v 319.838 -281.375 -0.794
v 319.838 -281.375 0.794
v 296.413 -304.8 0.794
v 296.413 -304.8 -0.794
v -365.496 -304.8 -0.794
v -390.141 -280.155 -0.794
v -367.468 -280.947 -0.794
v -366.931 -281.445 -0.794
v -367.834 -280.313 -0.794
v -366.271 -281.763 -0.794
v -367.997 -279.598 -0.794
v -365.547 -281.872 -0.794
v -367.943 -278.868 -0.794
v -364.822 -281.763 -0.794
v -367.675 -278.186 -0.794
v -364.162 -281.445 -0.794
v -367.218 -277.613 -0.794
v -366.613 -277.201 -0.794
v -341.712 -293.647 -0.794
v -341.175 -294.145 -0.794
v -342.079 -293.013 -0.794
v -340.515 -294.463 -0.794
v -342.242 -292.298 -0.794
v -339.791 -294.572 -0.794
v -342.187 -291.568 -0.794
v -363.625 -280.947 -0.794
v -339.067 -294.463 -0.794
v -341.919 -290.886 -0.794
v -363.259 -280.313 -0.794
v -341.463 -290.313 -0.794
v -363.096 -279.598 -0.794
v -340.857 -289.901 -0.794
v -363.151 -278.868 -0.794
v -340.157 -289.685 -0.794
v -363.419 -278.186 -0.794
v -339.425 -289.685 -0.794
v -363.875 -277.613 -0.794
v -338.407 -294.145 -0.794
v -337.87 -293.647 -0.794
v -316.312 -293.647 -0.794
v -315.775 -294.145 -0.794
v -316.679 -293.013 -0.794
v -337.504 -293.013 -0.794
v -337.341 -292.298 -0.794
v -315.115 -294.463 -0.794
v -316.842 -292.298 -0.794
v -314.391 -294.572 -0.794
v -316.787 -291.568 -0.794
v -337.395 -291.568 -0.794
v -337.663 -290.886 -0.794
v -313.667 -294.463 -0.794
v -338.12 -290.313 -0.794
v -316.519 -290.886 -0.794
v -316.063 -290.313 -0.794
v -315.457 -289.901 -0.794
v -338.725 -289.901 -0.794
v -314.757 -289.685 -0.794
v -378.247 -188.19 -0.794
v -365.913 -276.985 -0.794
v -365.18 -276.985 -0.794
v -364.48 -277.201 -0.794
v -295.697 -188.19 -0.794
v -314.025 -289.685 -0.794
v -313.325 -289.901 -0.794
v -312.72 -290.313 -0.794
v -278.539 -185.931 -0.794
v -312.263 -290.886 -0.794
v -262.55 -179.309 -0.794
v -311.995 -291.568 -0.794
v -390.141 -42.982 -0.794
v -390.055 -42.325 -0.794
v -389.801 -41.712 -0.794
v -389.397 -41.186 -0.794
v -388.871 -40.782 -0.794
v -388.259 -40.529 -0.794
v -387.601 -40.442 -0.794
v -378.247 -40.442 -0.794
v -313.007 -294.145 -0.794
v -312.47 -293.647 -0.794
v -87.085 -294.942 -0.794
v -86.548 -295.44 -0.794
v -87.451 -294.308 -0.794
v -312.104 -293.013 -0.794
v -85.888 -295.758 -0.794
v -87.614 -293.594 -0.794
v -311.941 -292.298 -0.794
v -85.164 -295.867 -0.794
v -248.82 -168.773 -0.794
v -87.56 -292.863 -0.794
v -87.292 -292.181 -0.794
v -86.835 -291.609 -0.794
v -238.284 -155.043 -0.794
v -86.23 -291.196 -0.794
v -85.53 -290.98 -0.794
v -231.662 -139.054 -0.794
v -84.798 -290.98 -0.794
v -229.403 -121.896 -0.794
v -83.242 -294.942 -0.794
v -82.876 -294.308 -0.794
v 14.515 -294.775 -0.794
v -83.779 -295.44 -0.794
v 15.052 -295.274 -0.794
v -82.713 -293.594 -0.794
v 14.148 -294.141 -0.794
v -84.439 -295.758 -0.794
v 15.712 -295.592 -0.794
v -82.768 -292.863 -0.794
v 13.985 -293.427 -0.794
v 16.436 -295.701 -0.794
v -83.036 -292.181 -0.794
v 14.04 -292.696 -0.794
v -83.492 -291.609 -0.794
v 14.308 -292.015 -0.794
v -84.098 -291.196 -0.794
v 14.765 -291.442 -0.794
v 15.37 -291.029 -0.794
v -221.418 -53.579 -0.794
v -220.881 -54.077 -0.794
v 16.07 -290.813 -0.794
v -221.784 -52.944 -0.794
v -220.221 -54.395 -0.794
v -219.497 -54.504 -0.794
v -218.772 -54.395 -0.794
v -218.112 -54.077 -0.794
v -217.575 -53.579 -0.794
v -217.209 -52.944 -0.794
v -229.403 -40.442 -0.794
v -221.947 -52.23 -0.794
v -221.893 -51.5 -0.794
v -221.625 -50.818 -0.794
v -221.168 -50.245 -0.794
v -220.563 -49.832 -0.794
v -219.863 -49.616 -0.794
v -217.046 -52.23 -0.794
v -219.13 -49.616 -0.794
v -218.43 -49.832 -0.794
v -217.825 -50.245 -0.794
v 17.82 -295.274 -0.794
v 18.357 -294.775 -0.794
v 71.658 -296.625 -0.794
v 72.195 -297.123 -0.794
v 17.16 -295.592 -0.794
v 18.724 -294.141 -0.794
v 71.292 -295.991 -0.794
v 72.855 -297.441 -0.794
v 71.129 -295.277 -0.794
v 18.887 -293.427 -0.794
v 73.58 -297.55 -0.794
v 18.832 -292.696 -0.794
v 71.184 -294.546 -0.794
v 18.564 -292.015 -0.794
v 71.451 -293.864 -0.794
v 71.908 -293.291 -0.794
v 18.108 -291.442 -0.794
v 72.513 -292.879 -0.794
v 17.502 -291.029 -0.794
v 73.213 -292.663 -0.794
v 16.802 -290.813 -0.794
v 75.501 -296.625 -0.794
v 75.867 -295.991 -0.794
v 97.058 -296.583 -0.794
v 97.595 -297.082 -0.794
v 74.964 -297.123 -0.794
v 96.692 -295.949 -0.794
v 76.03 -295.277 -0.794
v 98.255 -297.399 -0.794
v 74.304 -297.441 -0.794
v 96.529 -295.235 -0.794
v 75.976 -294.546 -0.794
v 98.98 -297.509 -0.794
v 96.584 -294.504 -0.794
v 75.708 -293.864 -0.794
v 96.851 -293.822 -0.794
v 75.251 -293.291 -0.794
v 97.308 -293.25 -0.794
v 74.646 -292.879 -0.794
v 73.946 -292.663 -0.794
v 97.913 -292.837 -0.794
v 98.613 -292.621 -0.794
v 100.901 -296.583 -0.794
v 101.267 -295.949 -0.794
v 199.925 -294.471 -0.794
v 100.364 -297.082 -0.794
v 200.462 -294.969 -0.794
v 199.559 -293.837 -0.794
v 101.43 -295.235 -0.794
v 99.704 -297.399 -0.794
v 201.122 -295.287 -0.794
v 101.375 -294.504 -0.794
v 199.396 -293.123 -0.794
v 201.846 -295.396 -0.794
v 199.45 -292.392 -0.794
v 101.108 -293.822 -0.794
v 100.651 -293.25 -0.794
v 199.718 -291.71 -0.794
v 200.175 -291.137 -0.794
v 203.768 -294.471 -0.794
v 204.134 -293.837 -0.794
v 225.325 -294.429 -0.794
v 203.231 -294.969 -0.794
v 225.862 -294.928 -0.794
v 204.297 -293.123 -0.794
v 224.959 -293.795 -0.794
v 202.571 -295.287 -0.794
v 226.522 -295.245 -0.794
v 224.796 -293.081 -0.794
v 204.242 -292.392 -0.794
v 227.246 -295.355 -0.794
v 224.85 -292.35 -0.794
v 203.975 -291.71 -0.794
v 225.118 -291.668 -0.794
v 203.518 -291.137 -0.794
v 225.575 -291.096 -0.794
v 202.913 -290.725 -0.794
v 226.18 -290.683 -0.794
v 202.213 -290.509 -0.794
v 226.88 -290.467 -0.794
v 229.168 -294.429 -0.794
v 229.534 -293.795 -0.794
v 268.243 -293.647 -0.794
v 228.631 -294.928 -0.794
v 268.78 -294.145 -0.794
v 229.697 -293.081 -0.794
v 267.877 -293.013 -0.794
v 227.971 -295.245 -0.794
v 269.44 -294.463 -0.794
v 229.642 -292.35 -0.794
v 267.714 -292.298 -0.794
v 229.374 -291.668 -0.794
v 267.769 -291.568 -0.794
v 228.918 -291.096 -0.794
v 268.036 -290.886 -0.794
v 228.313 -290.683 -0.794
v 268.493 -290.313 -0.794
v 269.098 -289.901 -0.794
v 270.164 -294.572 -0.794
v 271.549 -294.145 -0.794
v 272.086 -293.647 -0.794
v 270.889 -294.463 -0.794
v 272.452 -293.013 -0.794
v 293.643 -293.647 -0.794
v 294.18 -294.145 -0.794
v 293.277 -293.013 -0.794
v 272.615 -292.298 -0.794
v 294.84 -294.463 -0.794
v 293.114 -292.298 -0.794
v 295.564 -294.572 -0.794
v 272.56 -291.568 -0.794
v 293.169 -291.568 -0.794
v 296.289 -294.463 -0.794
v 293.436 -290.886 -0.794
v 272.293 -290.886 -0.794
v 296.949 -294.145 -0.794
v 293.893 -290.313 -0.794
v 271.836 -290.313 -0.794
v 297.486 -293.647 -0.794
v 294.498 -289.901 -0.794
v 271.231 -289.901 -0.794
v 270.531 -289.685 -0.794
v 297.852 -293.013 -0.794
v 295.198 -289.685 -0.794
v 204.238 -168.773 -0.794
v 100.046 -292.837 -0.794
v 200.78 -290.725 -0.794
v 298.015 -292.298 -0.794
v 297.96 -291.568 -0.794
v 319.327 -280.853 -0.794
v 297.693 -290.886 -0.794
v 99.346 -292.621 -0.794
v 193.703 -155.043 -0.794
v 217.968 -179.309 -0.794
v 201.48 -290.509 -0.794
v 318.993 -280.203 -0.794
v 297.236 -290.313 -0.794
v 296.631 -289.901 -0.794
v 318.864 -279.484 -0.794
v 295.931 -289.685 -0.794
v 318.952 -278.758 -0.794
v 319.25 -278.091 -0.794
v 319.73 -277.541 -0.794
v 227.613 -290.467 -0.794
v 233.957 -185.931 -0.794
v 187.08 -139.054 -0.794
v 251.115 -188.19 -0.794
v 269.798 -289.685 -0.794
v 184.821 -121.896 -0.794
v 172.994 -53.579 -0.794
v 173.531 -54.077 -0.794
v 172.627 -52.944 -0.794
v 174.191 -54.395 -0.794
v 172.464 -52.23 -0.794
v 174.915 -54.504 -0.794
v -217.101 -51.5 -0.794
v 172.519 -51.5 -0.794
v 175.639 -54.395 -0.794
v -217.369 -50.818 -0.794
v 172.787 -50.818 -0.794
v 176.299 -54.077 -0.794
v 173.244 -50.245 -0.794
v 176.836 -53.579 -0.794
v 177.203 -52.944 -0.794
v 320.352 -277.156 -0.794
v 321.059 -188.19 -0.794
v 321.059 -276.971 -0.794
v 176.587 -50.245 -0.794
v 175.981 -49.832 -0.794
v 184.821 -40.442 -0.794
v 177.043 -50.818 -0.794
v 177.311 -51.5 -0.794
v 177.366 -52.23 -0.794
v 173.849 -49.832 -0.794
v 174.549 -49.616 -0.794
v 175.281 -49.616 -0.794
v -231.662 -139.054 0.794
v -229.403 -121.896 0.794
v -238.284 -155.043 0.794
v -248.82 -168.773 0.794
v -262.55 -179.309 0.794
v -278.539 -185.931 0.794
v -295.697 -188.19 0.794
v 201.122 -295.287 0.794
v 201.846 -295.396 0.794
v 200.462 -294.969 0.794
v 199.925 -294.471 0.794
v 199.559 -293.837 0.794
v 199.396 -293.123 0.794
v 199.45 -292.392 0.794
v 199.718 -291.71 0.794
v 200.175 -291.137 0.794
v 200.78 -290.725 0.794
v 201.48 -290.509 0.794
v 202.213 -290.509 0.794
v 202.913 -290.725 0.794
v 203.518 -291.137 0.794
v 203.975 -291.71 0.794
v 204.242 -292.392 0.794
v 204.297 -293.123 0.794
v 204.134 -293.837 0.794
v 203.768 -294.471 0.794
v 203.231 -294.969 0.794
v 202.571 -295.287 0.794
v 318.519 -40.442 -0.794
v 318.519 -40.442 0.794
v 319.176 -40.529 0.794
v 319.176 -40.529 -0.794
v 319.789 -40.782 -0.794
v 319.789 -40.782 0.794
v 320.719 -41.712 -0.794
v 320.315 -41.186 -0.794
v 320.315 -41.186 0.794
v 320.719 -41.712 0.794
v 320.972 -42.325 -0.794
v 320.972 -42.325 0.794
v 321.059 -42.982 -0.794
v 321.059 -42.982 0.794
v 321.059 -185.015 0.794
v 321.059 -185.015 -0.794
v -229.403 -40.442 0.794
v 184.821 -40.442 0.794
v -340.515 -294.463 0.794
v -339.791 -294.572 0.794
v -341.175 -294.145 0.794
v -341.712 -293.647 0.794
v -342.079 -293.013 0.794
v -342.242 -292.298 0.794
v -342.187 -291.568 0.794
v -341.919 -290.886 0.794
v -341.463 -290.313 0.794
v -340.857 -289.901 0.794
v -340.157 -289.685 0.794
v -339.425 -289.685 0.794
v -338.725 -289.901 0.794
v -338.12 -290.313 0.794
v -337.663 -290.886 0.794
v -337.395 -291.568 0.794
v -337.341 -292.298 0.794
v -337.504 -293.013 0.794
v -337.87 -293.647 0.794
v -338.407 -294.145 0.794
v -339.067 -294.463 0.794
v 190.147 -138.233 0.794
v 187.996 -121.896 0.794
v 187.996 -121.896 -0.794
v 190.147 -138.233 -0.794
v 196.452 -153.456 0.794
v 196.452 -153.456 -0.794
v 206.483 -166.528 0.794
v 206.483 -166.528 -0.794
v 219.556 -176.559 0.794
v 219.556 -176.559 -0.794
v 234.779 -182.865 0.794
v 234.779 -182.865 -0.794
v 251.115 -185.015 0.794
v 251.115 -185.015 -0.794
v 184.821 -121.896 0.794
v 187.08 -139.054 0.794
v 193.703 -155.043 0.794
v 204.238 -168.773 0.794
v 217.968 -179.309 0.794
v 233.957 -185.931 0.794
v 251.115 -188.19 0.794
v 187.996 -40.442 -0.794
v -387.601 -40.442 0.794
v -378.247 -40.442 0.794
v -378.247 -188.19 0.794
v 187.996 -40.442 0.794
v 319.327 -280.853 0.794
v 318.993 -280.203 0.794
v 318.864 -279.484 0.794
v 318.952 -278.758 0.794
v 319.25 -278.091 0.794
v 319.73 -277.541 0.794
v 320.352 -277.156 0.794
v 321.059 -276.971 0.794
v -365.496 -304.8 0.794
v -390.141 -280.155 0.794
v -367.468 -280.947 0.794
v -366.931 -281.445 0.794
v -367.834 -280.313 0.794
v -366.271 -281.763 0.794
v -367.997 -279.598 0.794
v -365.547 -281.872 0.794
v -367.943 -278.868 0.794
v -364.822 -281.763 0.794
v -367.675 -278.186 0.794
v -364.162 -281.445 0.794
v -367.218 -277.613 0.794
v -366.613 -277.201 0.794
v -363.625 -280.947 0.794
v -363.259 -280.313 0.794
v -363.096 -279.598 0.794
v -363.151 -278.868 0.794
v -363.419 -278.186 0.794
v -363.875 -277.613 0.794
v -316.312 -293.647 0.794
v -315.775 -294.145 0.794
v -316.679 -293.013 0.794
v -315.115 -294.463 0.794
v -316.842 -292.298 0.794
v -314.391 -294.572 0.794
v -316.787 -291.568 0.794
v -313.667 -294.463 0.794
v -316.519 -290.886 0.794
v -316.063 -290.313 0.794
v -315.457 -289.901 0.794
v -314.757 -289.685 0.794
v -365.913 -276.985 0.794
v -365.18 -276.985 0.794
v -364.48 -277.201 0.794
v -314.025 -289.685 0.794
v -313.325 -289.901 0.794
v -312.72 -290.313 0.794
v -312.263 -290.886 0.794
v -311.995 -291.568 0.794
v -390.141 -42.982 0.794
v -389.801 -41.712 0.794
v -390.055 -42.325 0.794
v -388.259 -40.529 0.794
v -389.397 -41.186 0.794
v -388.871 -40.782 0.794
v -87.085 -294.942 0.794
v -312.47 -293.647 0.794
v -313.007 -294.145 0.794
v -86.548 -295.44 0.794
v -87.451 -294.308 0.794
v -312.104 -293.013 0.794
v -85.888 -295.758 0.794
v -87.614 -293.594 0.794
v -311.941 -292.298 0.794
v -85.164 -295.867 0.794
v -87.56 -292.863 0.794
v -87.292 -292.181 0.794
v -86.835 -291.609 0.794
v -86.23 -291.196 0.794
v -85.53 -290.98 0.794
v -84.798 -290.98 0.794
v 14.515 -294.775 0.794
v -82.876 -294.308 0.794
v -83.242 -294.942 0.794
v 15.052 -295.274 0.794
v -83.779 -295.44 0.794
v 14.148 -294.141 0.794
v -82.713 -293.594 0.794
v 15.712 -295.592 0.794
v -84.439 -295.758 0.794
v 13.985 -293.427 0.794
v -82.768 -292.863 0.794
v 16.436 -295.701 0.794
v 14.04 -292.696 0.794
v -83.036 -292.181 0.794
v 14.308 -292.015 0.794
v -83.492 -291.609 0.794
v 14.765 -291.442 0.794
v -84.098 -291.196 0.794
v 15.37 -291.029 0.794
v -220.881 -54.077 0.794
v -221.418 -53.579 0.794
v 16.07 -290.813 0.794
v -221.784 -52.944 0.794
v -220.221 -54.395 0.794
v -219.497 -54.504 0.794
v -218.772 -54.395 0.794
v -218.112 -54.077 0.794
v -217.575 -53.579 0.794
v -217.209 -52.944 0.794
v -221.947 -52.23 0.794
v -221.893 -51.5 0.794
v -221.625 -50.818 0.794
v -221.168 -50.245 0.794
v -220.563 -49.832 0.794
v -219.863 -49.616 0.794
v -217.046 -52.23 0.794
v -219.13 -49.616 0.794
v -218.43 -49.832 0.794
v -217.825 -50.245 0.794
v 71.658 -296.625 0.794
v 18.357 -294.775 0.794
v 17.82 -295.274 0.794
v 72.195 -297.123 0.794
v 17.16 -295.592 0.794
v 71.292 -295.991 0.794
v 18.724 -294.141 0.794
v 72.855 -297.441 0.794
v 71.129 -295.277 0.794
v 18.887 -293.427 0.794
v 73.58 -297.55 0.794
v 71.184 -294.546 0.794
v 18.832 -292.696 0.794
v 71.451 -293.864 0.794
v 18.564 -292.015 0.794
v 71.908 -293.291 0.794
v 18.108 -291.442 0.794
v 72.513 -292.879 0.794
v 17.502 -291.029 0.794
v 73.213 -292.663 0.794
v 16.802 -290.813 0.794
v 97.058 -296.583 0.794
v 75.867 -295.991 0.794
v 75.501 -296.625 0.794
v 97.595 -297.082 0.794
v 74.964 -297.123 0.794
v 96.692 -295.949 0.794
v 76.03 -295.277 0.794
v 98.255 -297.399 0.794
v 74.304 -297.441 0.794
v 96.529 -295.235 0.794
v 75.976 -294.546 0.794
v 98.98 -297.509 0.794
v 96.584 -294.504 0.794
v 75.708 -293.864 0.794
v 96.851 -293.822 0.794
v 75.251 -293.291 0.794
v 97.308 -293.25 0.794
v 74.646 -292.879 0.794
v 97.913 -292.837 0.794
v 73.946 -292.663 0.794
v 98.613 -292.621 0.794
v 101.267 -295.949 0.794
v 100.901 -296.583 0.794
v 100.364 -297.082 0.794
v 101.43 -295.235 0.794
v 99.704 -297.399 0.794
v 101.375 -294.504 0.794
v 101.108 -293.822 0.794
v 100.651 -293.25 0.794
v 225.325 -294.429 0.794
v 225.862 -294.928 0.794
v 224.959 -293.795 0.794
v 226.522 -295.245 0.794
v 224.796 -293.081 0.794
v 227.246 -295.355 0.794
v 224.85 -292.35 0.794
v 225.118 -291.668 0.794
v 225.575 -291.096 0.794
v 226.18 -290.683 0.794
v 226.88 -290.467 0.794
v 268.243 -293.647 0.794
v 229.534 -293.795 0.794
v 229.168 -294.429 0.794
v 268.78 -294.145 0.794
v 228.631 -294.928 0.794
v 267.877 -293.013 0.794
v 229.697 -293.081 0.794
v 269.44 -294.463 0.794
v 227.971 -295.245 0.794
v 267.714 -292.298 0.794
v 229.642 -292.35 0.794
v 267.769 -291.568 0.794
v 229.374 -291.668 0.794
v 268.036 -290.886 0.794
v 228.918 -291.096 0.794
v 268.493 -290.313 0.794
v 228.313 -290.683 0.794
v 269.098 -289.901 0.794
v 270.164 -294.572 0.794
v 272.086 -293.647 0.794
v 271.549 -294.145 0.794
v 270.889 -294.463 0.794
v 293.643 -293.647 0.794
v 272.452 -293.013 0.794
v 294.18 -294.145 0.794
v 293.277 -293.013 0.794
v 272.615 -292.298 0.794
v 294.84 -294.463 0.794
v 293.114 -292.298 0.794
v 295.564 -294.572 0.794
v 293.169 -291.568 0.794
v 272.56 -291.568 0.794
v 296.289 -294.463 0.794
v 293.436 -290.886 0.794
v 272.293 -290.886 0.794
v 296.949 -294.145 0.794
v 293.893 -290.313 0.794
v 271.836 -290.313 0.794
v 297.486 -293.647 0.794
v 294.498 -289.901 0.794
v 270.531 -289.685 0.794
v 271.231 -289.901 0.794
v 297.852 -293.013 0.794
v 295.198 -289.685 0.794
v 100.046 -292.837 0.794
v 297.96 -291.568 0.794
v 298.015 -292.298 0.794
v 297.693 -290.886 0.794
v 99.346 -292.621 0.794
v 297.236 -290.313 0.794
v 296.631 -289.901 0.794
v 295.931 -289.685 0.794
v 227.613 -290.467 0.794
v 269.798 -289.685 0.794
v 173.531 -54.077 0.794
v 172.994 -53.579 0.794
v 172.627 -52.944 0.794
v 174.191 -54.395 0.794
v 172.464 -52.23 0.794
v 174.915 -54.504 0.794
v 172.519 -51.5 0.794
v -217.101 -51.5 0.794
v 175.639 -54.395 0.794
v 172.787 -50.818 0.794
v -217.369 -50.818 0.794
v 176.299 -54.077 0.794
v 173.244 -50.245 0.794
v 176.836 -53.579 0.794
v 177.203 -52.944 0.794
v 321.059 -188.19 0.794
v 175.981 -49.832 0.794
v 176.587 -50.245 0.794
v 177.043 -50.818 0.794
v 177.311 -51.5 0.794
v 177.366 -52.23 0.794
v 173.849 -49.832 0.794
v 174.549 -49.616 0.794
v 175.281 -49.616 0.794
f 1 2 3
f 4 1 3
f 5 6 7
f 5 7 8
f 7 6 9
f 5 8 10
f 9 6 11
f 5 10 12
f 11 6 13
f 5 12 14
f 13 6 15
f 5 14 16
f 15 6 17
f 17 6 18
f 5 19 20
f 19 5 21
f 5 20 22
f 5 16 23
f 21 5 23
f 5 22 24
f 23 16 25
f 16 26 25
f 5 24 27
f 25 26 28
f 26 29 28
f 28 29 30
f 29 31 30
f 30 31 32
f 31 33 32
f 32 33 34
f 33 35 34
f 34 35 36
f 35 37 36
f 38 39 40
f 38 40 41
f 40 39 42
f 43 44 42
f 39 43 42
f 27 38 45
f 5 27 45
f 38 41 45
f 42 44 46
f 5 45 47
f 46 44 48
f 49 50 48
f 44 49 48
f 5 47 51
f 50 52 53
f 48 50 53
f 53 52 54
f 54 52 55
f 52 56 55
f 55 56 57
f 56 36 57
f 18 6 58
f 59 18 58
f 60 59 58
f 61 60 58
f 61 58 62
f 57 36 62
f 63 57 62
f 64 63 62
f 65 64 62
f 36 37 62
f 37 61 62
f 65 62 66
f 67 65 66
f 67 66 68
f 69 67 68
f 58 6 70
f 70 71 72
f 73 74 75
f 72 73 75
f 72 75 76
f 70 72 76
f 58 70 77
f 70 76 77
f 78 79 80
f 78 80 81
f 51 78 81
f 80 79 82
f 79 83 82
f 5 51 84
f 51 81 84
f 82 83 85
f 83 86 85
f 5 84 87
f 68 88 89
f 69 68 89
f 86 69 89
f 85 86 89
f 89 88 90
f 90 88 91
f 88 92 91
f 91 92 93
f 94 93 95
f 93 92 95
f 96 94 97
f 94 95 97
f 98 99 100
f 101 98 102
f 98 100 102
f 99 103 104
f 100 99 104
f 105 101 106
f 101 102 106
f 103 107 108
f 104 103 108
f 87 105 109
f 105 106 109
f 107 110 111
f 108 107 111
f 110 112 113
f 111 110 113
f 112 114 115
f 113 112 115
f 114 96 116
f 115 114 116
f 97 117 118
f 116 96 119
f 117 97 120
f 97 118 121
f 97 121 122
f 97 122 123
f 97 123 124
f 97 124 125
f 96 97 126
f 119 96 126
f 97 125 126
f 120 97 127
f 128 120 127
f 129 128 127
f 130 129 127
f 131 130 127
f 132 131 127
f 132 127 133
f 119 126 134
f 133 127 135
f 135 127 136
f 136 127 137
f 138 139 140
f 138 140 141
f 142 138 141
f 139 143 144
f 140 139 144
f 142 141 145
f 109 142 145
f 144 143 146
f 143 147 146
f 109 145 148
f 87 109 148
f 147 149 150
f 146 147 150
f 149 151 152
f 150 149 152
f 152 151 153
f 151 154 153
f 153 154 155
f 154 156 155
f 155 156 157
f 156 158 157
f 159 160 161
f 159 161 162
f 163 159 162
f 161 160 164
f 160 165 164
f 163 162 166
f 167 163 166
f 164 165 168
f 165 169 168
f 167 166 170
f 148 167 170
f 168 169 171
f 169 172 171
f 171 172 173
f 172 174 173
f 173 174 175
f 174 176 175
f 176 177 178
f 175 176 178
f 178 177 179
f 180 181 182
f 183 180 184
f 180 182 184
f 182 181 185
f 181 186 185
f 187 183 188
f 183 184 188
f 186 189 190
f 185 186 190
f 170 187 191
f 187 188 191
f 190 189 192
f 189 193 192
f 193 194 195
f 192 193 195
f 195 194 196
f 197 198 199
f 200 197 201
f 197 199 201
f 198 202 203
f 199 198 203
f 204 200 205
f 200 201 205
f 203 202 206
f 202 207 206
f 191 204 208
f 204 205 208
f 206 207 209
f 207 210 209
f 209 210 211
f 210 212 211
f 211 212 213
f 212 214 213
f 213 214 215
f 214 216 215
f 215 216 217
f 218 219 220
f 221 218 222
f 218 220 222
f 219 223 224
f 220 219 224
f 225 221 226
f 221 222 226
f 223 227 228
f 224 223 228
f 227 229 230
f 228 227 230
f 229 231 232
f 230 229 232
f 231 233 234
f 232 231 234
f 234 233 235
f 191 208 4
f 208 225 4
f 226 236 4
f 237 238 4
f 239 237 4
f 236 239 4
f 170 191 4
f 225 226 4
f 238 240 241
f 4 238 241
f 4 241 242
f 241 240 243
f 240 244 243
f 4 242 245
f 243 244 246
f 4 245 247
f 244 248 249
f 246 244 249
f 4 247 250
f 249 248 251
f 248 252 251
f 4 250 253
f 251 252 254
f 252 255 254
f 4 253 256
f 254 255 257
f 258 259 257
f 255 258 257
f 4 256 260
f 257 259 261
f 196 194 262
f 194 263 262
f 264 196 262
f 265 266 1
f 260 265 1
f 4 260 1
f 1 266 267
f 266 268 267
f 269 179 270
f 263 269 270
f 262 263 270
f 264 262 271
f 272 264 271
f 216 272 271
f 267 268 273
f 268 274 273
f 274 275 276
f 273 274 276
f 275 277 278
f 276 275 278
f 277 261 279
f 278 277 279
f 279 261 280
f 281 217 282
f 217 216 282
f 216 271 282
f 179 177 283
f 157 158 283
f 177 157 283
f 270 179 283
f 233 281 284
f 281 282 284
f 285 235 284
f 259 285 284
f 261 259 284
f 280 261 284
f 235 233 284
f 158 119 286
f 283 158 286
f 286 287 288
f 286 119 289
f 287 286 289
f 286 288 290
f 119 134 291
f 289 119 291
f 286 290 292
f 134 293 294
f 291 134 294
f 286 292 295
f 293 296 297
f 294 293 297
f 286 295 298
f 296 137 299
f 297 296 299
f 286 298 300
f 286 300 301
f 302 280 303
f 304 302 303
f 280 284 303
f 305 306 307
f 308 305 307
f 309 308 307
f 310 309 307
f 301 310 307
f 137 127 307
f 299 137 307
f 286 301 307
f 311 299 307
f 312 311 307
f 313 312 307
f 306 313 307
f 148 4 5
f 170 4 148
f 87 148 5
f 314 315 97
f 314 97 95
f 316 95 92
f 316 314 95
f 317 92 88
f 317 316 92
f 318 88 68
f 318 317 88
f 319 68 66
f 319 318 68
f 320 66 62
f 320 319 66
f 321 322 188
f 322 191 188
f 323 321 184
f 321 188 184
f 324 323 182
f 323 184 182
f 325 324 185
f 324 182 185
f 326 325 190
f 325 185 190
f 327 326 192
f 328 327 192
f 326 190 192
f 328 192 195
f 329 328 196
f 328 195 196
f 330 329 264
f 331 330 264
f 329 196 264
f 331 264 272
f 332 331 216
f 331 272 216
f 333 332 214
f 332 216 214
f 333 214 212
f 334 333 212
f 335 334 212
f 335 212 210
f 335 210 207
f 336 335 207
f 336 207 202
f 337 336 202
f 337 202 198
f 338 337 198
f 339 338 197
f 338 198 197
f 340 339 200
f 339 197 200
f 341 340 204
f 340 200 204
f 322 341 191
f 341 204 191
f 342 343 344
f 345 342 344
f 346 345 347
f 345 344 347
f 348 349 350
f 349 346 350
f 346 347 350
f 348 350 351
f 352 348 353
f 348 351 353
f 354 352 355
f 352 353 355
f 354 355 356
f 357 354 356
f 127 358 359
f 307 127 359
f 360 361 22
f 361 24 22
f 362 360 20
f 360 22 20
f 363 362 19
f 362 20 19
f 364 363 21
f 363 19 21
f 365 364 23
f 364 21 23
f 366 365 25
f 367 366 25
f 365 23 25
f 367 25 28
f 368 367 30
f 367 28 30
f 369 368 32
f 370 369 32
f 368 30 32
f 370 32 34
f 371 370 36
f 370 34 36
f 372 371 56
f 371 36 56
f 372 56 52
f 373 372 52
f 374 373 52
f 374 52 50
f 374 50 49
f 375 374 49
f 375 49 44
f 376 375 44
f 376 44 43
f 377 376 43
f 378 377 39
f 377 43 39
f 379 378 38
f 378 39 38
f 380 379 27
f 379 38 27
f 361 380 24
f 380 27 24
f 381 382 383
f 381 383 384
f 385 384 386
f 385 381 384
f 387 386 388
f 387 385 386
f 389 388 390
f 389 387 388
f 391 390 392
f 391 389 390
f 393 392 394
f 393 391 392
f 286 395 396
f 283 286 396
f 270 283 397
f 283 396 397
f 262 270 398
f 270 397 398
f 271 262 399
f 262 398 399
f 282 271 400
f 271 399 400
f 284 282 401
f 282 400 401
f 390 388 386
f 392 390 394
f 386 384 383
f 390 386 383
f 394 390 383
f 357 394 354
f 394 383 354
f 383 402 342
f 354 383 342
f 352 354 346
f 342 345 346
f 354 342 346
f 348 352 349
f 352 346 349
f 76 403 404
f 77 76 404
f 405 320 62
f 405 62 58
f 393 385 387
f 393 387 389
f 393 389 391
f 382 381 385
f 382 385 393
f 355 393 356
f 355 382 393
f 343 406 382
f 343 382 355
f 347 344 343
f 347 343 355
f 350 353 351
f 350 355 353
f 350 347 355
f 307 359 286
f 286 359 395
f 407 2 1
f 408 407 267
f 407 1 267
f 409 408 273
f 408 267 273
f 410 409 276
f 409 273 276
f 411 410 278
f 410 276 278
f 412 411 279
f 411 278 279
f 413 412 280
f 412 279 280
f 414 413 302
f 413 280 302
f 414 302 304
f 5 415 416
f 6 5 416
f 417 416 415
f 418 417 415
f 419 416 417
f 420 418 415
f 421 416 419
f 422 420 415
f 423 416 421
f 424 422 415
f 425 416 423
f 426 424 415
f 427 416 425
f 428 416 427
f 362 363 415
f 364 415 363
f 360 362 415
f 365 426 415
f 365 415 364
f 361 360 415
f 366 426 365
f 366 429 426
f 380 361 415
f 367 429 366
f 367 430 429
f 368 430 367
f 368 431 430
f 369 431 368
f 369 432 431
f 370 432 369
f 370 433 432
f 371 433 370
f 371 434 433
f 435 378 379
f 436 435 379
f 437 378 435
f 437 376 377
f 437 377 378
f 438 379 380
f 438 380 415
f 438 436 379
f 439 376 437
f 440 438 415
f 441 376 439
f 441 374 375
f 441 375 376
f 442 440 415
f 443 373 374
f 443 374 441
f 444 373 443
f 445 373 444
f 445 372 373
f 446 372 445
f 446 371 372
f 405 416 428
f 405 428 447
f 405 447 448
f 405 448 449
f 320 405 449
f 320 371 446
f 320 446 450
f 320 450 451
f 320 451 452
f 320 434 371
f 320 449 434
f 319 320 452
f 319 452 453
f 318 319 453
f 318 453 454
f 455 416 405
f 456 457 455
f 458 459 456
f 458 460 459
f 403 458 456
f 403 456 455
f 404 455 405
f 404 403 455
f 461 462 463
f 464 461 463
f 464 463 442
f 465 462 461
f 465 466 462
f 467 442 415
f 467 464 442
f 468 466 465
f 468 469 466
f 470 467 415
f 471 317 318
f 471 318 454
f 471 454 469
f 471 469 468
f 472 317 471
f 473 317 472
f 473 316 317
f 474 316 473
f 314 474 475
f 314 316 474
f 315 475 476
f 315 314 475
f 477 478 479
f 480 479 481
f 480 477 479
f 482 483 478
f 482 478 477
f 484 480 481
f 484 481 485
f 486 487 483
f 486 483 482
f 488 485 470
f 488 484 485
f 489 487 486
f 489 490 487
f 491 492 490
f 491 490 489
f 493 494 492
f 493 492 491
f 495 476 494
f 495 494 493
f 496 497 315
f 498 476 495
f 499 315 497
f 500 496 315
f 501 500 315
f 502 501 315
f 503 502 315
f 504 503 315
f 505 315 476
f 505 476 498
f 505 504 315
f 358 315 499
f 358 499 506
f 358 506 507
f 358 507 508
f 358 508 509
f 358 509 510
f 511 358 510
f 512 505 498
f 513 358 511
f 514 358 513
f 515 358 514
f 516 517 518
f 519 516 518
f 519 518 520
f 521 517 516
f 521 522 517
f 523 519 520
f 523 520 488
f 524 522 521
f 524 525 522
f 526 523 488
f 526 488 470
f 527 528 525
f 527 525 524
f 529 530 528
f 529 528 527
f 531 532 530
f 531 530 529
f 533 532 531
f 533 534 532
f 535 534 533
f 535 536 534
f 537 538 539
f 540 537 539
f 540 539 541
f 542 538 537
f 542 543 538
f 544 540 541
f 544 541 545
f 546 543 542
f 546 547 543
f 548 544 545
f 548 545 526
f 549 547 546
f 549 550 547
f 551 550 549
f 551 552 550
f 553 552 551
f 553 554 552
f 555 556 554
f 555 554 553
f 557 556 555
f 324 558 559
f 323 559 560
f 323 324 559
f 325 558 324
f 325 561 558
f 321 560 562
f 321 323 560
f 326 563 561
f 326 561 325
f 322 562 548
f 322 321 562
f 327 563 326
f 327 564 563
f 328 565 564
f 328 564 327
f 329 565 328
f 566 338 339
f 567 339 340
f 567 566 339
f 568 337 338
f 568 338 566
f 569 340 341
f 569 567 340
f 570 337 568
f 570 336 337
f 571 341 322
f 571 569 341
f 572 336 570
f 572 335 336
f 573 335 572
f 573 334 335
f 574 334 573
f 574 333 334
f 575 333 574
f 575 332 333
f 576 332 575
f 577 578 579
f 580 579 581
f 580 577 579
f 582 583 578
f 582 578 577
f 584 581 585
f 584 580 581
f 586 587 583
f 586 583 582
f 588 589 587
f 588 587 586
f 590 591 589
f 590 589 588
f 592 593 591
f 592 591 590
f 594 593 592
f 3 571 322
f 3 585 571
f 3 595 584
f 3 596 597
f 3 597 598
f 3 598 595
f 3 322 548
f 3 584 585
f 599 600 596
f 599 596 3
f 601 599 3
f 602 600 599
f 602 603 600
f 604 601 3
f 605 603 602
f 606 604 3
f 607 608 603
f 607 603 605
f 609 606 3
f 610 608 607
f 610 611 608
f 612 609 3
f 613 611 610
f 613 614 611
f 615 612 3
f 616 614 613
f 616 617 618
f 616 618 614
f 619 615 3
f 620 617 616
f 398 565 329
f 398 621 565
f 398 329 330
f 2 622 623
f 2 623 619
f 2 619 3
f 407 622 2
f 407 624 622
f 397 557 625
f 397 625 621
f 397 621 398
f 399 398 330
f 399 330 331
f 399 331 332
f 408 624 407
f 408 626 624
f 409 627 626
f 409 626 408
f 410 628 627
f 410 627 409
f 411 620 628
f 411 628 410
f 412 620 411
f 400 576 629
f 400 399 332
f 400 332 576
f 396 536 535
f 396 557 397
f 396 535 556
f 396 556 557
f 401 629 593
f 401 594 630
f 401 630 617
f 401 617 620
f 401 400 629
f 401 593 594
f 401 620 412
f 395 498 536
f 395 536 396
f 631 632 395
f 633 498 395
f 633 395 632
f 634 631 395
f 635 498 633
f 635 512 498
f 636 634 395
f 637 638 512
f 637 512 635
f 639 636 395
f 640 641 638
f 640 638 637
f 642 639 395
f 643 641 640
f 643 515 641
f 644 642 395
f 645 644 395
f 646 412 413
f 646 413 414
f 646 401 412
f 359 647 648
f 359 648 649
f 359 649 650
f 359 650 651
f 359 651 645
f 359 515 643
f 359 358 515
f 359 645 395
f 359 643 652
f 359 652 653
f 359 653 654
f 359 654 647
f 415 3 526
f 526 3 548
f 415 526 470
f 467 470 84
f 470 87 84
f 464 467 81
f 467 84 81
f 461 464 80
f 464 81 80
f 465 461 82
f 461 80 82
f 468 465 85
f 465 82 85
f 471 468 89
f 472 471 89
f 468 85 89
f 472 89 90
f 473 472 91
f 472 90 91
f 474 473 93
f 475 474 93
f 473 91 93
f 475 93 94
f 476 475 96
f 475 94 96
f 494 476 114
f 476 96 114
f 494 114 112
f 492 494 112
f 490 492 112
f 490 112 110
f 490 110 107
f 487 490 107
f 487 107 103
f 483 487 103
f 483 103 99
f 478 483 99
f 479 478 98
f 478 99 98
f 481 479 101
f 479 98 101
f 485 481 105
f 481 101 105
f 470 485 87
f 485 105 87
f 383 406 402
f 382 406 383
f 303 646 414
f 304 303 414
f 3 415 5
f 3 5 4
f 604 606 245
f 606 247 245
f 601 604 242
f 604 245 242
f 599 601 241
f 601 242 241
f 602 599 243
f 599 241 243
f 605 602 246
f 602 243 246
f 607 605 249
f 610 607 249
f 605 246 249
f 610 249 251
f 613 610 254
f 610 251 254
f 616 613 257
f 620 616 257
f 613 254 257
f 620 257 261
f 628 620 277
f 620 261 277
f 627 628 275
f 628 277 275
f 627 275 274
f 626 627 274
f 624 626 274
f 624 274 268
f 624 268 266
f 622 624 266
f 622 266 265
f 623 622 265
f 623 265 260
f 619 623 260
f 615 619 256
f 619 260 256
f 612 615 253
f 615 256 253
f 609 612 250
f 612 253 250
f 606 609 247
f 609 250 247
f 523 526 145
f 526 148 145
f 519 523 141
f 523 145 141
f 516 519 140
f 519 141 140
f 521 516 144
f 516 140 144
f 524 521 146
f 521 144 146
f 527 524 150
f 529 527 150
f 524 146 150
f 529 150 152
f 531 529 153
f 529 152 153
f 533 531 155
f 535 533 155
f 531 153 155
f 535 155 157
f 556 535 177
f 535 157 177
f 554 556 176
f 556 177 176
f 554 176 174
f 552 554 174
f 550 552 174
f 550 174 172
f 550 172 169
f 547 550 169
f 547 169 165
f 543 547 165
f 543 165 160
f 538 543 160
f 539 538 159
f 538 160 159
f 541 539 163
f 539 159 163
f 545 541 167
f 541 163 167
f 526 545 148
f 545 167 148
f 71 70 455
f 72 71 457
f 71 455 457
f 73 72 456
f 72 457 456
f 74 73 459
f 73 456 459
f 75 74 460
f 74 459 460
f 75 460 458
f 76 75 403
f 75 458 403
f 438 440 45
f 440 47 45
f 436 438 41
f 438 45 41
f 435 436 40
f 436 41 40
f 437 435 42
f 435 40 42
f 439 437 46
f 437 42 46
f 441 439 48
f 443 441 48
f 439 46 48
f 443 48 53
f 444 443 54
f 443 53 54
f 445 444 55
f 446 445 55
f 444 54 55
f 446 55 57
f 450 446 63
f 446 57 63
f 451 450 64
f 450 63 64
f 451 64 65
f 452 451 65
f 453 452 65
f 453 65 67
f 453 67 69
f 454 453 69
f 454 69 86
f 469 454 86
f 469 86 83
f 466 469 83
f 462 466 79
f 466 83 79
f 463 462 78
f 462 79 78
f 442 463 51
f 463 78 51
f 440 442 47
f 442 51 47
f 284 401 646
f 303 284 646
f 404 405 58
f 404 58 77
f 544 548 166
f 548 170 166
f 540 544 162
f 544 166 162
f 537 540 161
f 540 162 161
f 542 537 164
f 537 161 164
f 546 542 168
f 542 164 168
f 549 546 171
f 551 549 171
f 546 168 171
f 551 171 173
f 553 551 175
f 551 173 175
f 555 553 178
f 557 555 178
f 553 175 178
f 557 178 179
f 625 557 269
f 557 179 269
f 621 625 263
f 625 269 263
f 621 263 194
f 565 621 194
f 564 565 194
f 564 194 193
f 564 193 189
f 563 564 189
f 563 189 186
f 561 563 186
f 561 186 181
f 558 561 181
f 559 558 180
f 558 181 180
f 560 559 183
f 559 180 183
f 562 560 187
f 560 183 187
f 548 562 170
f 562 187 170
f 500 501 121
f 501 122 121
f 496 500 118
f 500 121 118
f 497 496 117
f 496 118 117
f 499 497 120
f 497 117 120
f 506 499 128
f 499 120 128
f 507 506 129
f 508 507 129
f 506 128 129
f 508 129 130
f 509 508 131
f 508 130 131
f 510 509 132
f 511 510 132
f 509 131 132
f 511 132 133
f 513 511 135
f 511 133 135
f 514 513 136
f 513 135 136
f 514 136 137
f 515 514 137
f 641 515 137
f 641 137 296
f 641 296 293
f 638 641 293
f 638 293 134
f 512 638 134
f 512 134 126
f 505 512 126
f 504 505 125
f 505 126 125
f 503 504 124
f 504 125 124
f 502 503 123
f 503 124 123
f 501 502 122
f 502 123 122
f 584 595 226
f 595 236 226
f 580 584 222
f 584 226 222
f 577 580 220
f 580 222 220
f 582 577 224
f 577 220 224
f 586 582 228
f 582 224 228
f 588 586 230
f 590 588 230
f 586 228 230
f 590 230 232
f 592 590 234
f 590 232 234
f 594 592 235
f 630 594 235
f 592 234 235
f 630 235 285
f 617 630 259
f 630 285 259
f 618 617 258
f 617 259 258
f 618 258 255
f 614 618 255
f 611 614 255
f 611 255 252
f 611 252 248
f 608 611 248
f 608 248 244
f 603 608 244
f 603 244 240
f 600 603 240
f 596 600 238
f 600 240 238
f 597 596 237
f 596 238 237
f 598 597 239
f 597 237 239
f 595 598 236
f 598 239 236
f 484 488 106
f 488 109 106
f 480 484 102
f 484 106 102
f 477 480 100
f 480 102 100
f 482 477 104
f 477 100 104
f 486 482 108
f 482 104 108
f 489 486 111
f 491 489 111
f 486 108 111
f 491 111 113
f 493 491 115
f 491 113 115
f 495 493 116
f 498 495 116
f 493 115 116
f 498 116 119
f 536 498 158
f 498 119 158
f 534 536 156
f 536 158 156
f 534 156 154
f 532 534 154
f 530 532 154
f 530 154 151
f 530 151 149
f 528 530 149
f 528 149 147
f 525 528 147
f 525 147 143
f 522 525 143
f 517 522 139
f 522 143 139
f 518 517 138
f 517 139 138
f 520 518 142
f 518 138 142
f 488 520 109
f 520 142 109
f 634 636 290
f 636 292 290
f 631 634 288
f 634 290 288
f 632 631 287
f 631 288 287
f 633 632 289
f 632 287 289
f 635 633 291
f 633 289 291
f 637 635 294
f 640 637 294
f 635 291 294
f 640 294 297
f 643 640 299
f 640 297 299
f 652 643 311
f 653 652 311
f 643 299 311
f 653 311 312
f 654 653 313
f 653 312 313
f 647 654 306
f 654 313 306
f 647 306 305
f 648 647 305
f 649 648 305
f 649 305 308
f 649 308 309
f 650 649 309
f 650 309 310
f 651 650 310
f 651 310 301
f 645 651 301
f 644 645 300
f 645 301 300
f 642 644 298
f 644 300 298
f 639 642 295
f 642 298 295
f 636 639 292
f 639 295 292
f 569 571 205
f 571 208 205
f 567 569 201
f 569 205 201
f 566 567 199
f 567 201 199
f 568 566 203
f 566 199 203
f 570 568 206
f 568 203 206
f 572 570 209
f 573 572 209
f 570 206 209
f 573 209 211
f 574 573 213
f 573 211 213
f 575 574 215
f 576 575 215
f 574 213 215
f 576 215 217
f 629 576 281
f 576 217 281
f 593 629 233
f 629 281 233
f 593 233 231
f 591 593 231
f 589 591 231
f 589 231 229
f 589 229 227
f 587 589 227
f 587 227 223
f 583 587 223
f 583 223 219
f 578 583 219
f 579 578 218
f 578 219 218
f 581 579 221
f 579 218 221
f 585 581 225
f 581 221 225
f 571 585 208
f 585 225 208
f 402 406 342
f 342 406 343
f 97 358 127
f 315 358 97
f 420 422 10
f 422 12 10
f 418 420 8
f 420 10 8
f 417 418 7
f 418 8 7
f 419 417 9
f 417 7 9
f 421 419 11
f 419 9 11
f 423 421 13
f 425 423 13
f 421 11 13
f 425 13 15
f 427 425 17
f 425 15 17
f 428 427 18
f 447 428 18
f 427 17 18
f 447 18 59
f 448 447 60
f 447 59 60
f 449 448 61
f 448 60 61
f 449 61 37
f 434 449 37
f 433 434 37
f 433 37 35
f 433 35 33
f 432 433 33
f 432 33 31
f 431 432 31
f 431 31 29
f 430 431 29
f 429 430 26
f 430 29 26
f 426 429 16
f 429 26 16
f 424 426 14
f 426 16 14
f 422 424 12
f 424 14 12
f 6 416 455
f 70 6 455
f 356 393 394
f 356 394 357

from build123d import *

# Parameters (mm, degrees)
SKETCH3_W                              = 914.4
SKETCH3_H                              = 609.6
BOSS_EXTRUDE1_DEPTH                    = 0.79375
SKETCH4_OUTSIDE_W                      = 1136.194
SKETCH4_OUTSIDE_H                      = 831.394
CUT_EXTRUDE1_DEPTH                     = 2.54
CUT_EXTRUDE2_DEPTH                     = 2.54
CUT_EXTRUDE3_DEPTH                     = 2.54
SKETCH11_W                             = 2.45745
SKETCH11_H                             = 1.5875
F_10_0_1935_DIAMETER_HOLE1_AT_2_COUNT  = 2
F_10_0_1935_DIAMETER_HOLE1_AT_2_PITCH  = 25.4
F_10_0_1935_DIAMETER_HOLE1_AT_3_COUNT  = 2
F_10_0_1935_DIAMETER_HOLE1_AT_3_PITCH  = 52.708494186
F_10_0_1935_DIAMETER_HOLE1_AT_4_COUNT  = 2
F_10_0_1935_DIAMETER_HOLE1_AT_4_PITCH  = 609.955600508
F_10_0_1935_DIAMETER_HOLE1_AT_5_COUNT  = 2
F_10_0_1935_DIAMETER_HOLE1_AT_5_PITCH  = 584.555600508
F_10_0_1935_DIAMETER_HOLE1_AT_6_COUNT  = 2
F_10_0_1935_DIAMETER_HOLE1_AT_6_PITCH  = 635.838045264
F_10_0_1935_DIAMETER_HOLE1_AT_7_COUNT  = 2
F_10_0_1935_DIAMETER_HOLE1_AT_7_PITCH  = 545.026051512
F_10_0_1935_DIAMETER_HOLE1_AT_8_COUNT  = 2
F_10_0_1935_DIAMETER_HOLE1_AT_8_PITCH  = 258.142956966
F_10_0_1935_DIAMETER_HOLE1_AT_9_COUNT  = 2
F_10_0_1935_DIAMETER_HOLE1_AT_9_PITCH  = 387.982235928
F_10_0_1935_DIAMETER_HOLE1_AT_10_COUNT = 2
F_10_0_1935_DIAMETER_HOLE1_AT_10_PITCH = 413.381201108
F_10_0_1935_DIAMETER_HOLE1_AT_11_COUNT = 2
F_10_0_1935_DIAMETER_HOLE1_AT_11_PITCH = 516.238100689
F_10_0_1935_DIAMETER_HOLE1_AT_12_COUNT = 2
F_10_0_1935_DIAMETER_HOLE1_AT_12_PITCH = 541.637973776
F_10_0_1935_DIAMETER_HOLE1_AT_13_COUNT = 2
F_10_0_1935_DIAMETER_HOLE1_AT_13_PITCH = 229.23100458
F_10_0_1935_DIAMETER_HOLE1_AT_14_COUNT = 2
F_10_0_1935_DIAMETER_HOLE1_AT_14_PITCH = 330.829132824


with BuildPart() as part:
    # Sketch3 → Boss-Extrude1 (new, symmetric)
    with BuildSketch(Plane.XY):
        Rectangle(SKETCH3_W, SKETCH3_H)
    extrude(amount=BOSS_EXTRUDE1_DEPTH, both=True)

    # Sketch4 outside → Cut-Extrude1 (cut)
    with BuildSketch(Plane.XY.offset(0.79375)):
        Rectangle(SKETCH4_OUTSIDE_W, SKETCH4_OUTSIDE_H)
        with BuildLine():
            Line((-364.741176915, -305.554584202), (-390.141176915, -280.154584202))
            Line((-390.141176915, -280.154584202), (-390.141176915, -42.982084202))
            ThreePointArc((-390.141176915, -42.982084202), (-389.397228139, -41.186032978), (-387.601176915, -40.442084202))
            Line((-387.601176915, -40.442084202), (318.518823085, -40.442084202))
            ThreePointArc((318.518823085, -40.442084202), (320.314874309, -41.186032978), (321.058823085, -42.982084202))
            Line((321.058823085, -42.982084202), (321.058823085, -280.154584202))
            Line((321.058823085, -280.154584202), (295.658823085, -305.554584202))
            Line((295.658823085, -305.554584202), (-364.741176915, -305.554584202))
        make_face(mode=Mode.SUBTRACT)
    extrude(amount=-CUT_EXTRUDE1_DEPTH, mode=Mode.SUBTRACT)

    # Sketch7 → Cut-Extrude2 (cut)
    with BuildSketch(Plane.XY.offset(0.79375)):
        with BuildLine():
            Line((-378.246738216, -188.190344021), (-378.246738216, -39.346344021))
            Line((-378.246738216, -39.346344021), (-229.402738216, -39.346344021))
            Line((-229.402738216, -39.346344021), (-229.402738216, -64.746344021))
            Line((-229.402738216, -64.746344021), (-229.402738216, -121.896344021))
            ThreePointArc((-229.402738216, -121.896344021), (-248.819801264, -168.773280973), (-295.696738216, -188.190344021))
            Line((-295.696738216, -188.190344021), (-352.846738216, -188.190344021))
            Line((-352.846738216, -188.190344021), (-378.246738216, -188.190344021))
        make_face()
    extrude(amount=-CUT_EXTRUDE2_DEPTH, mode=Mode.SUBTRACT)

    # Sketch8 → Cut-Extrude3 (cut)
    with BuildSketch(Plane.XY.offset(0.79375)):
        with BuildLine():
            Line((251.115061771, -188.190344021), (336.840061771, -188.190344021))
            Line((336.840061771, -188.190344021), (336.840061771, -36.171344021))
            Line((336.840061771, -36.171344021), (184.821061771, -36.171344021))
            Line((184.821061771, -36.171344021), (184.821061771, -121.896344021))
            ThreePointArc((184.821061771, -121.896344021), (204.238124819, -168.773280973), (251.115061771, -188.190344021))
        make_face()
        with BuildLine():
            Line((251.115061771, -185.015344021), (333.665061771, -185.015344021))
            Line((333.665061771, -185.015344021), (333.665061771, -39.346344021))
            Line((333.665061771, -39.346344021), (187.996061771, -39.346344021))
            Line((187.996061771, -39.346344021), (187.996061771, -121.896344021))
            ThreePointArc((187.996061771, -121.896344021), (206.483188849, -166.528216943), (251.115061771, -185.015344021))
        make_face(mode=Mode.SUBTRACT)
    extrude(amount=-CUT_EXTRUDE3_DEPTH, mode=Mode.SUBTRACT)


with BuildPart() as cut_extrude3_piece_1:
    # of the separate pieces the step leaves, piece 1, a body of its own (cut_extrude3_pieces)
    add(part.part.solids().sort_by_distance((296.413407287, -304.8, -0.79375))[0])

    # Sketch11 → #10 (0.1935) Diameter Hole1 (revolve, cut)
    with BuildSketch(Plane(origin=(-314.391138724, -292.114748821, 0.79375), x_dir=(0, -1, 0), z_dir=(1, 0, 0))):
        with Locations((1.228725, 0.79375)):
            Rectangle(SKETCH11_W, SKETCH11_H)
    f_10_0_1935_diameter_hole1 = revolve(axis=Axis((-314.391138724, -292.114748821, 7.14375), (0, 0, -1)), mode=Mode.SUBTRACT)

    # #10 (0.1935) Diameter Hole1 at 2: #10 (0.1935) Diameter Hole1 ×2
    with Locations(*[(-i * F_10_0_1935_DIAMETER_HOLE1_AT_2_PITCH, 0, 0) for i in range(1, F_10_0_1935_DIAMETER_HOLE1_AT_2_COUNT)]):
        add(f_10_0_1935_diameter_hole1, mode=Mode.SUBTRACT)

    # #10 (0.1935) Diameter Hole1 at 3: #10 (0.1935) Diameter Hole1 ×2
    with Locations(*[Vector(-0.9705380561850375, 0.2409478812867402, 0) * (i * F_10_0_1935_DIAMETER_HOLE1_AT_3_PITCH) for i in range(1, F_10_0_1935_DIAMETER_HOLE1_AT_3_COUNT)]):
        add(f_10_0_1935_diameter_hole1, mode=Mode.SUBTRACT)

    # #10 (0.1935) Diameter Hole1 at 4: #10 (0.1935) Diameter Hole1 ×2
    with Locations(*[(i * F_10_0_1935_DIAMETER_HOLE1_AT_4_PITCH, 0, 0) for i in range(1, F_10_0_1935_DIAMETER_HOLE1_AT_4_COUNT)]):
        add(f_10_0_1935_diameter_hole1, mode=Mode.SUBTRACT)

    # #10 (0.1935) Diameter Hole1 at 5: #10 (0.1935) Diameter Hole1 ×2
    with Locations(*[(i * F_10_0_1935_DIAMETER_HOLE1_AT_5_PITCH, 0, 0) for i in range(1, F_10_0_1935_DIAMETER_HOLE1_AT_5_COUNT)]):
        add(f_10_0_1935_diameter_hole1, mode=Mode.SUBTRACT)

    # #10 (0.1935) Diameter Hole1 at 6: #10 (0.1935) Diameter Hole1 ×2
    with Locations(*[Vector(0.9998005069605744, 0.01997363966277868, 0) * (i * F_10_0_1935_DIAMETER_HOLE1_AT_6_PITCH) for i in range(1, F_10_0_1935_DIAMETER_HOLE1_AT_6_COUNT)]):
        add(f_10_0_1935_diameter_hole1, mode=Mode.SUBTRACT)

    # #10 (0.1935) Diameter Hole1 at 7: #10 (0.1935) Diameter Hole1 ×2
    with Locations(*[Vector(0.8977666281056725, 0.44047143092347246, 0) * (i * F_10_0_1935_DIAMETER_HOLE1_AT_7_PITCH) for i in range(1, F_10_0_1935_DIAMETER_HOLE1_AT_7_COUNT)]):
        add(f_10_0_1935_diameter_hole1, mode=Mode.SUBTRACT)

    # #10 (0.1935) Diameter Hole1 at 8: #10 (0.1935) Diameter Hole1 ×2
    with Locations(*[Vector(0.3676040656829352, 0.929982392786754, 0) * (i * F_10_0_1935_DIAMETER_HOLE1_AT_8_PITCH) for i in range(1, F_10_0_1935_DIAMETER_HOLE1_AT_8_COUNT)]):
        add(f_10_0_1935_diameter_hole1, mode=Mode.SUBTRACT)

    # #10 (0.1935) Diameter Hole1 at 9: #10 (0.1935) Diameter Hole1 ×2
    with Locations(*[Vector(0.9999705397694504, -0.007675909926132699, 0) * (i * F_10_0_1935_DIAMETER_HOLE1_AT_9_PITCH) for i in range(1, F_10_0_1935_DIAMETER_HOLE1_AT_9_COUNT)]):
        add(f_10_0_1935_diameter_hole1, mode=Mode.SUBTRACT)

    # #10 (0.1935) Diameter Hole1 at 10: #10 (0.1935) Diameter Hole1 ×2
    with Locations(*[Vector(0.9999747703828846, -0.0071034215486100935, 0) * (i * F_10_0_1935_DIAMETER_HOLE1_AT_10_PITCH) for i in range(1, F_10_0_1935_DIAMETER_HOLE1_AT_10_COUNT)]):
        add(f_10_0_1935_diameter_hole1, mode=Mode.SUBTRACT)

    # #10 (0.1935) Diameter Hole1 at 11: #10 (0.1935) Diameter Hole1 ×2
    with Locations(*[Vector(0.9999987256648789, -0.0015964550160305706, 0) * (i * F_10_0_1935_DIAMETER_HOLE1_AT_11_PITCH) for i in range(1, F_10_0_1935_DIAMETER_HOLE1_AT_11_COUNT)]):
        add(f_10_0_1935_diameter_hole1, mode=Mode.SUBTRACT)

    # #10 (0.1935) Diameter Hole1 at 12: #10 (0.1935) Diameter Hole1 ×2
    with Locations(*[Vector(0.9999989565517423, -0.0014446090913347437, 0) * (i * F_10_0_1935_DIAMETER_HOLE1_AT_12_PITCH) for i in range(1, F_10_0_1935_DIAMETER_HOLE1_AT_12_COUNT)]):
        add(f_10_0_1935_diameter_hole1, mode=Mode.SUBTRACT)

    # #10 (0.1935) Diameter Hole1 at 13: #10 (0.1935) Diameter Hole1 ×2
    with Locations(*[Vector(0.9999840351163782, -0.005650620529293304, 0) * (i * F_10_0_1935_DIAMETER_HOLE1_AT_13_PITCH) for i in range(1, F_10_0_1935_DIAMETER_HOLE1_AT_13_COUNT)]):
        add(f_10_0_1935_diameter_hole1, mode=Mode.SUBTRACT)

    # #10 (0.1935) Diameter Hole1 at 14: #10 (0.1935) Diameter Hole1 ×2
    with Locations(*[Vector(0.9999941819431991, -0.003411169850958024, 0) * (i * F_10_0_1935_DIAMETER_HOLE1_AT_14_PITCH) for i in range(1, F_10_0_1935_DIAMETER_HOLE1_AT_14_COUNT)]):
        add(f_10_0_1935_diameter_hole1, mode=Mode.SUBTRACT)


with BuildPart() as cut_extrude3_piece_2:
    # of the separate pieces the step leaves, piece 2, a body of its own (cut_extrude3_pieces)
    add(part.part.solids().sort_by_distance((321.058823085, -42.982084202, 0.79375))[0])


solid = Compound([cut_extrude3_piece_1.part, cut_extrude3_piece_2.part])
